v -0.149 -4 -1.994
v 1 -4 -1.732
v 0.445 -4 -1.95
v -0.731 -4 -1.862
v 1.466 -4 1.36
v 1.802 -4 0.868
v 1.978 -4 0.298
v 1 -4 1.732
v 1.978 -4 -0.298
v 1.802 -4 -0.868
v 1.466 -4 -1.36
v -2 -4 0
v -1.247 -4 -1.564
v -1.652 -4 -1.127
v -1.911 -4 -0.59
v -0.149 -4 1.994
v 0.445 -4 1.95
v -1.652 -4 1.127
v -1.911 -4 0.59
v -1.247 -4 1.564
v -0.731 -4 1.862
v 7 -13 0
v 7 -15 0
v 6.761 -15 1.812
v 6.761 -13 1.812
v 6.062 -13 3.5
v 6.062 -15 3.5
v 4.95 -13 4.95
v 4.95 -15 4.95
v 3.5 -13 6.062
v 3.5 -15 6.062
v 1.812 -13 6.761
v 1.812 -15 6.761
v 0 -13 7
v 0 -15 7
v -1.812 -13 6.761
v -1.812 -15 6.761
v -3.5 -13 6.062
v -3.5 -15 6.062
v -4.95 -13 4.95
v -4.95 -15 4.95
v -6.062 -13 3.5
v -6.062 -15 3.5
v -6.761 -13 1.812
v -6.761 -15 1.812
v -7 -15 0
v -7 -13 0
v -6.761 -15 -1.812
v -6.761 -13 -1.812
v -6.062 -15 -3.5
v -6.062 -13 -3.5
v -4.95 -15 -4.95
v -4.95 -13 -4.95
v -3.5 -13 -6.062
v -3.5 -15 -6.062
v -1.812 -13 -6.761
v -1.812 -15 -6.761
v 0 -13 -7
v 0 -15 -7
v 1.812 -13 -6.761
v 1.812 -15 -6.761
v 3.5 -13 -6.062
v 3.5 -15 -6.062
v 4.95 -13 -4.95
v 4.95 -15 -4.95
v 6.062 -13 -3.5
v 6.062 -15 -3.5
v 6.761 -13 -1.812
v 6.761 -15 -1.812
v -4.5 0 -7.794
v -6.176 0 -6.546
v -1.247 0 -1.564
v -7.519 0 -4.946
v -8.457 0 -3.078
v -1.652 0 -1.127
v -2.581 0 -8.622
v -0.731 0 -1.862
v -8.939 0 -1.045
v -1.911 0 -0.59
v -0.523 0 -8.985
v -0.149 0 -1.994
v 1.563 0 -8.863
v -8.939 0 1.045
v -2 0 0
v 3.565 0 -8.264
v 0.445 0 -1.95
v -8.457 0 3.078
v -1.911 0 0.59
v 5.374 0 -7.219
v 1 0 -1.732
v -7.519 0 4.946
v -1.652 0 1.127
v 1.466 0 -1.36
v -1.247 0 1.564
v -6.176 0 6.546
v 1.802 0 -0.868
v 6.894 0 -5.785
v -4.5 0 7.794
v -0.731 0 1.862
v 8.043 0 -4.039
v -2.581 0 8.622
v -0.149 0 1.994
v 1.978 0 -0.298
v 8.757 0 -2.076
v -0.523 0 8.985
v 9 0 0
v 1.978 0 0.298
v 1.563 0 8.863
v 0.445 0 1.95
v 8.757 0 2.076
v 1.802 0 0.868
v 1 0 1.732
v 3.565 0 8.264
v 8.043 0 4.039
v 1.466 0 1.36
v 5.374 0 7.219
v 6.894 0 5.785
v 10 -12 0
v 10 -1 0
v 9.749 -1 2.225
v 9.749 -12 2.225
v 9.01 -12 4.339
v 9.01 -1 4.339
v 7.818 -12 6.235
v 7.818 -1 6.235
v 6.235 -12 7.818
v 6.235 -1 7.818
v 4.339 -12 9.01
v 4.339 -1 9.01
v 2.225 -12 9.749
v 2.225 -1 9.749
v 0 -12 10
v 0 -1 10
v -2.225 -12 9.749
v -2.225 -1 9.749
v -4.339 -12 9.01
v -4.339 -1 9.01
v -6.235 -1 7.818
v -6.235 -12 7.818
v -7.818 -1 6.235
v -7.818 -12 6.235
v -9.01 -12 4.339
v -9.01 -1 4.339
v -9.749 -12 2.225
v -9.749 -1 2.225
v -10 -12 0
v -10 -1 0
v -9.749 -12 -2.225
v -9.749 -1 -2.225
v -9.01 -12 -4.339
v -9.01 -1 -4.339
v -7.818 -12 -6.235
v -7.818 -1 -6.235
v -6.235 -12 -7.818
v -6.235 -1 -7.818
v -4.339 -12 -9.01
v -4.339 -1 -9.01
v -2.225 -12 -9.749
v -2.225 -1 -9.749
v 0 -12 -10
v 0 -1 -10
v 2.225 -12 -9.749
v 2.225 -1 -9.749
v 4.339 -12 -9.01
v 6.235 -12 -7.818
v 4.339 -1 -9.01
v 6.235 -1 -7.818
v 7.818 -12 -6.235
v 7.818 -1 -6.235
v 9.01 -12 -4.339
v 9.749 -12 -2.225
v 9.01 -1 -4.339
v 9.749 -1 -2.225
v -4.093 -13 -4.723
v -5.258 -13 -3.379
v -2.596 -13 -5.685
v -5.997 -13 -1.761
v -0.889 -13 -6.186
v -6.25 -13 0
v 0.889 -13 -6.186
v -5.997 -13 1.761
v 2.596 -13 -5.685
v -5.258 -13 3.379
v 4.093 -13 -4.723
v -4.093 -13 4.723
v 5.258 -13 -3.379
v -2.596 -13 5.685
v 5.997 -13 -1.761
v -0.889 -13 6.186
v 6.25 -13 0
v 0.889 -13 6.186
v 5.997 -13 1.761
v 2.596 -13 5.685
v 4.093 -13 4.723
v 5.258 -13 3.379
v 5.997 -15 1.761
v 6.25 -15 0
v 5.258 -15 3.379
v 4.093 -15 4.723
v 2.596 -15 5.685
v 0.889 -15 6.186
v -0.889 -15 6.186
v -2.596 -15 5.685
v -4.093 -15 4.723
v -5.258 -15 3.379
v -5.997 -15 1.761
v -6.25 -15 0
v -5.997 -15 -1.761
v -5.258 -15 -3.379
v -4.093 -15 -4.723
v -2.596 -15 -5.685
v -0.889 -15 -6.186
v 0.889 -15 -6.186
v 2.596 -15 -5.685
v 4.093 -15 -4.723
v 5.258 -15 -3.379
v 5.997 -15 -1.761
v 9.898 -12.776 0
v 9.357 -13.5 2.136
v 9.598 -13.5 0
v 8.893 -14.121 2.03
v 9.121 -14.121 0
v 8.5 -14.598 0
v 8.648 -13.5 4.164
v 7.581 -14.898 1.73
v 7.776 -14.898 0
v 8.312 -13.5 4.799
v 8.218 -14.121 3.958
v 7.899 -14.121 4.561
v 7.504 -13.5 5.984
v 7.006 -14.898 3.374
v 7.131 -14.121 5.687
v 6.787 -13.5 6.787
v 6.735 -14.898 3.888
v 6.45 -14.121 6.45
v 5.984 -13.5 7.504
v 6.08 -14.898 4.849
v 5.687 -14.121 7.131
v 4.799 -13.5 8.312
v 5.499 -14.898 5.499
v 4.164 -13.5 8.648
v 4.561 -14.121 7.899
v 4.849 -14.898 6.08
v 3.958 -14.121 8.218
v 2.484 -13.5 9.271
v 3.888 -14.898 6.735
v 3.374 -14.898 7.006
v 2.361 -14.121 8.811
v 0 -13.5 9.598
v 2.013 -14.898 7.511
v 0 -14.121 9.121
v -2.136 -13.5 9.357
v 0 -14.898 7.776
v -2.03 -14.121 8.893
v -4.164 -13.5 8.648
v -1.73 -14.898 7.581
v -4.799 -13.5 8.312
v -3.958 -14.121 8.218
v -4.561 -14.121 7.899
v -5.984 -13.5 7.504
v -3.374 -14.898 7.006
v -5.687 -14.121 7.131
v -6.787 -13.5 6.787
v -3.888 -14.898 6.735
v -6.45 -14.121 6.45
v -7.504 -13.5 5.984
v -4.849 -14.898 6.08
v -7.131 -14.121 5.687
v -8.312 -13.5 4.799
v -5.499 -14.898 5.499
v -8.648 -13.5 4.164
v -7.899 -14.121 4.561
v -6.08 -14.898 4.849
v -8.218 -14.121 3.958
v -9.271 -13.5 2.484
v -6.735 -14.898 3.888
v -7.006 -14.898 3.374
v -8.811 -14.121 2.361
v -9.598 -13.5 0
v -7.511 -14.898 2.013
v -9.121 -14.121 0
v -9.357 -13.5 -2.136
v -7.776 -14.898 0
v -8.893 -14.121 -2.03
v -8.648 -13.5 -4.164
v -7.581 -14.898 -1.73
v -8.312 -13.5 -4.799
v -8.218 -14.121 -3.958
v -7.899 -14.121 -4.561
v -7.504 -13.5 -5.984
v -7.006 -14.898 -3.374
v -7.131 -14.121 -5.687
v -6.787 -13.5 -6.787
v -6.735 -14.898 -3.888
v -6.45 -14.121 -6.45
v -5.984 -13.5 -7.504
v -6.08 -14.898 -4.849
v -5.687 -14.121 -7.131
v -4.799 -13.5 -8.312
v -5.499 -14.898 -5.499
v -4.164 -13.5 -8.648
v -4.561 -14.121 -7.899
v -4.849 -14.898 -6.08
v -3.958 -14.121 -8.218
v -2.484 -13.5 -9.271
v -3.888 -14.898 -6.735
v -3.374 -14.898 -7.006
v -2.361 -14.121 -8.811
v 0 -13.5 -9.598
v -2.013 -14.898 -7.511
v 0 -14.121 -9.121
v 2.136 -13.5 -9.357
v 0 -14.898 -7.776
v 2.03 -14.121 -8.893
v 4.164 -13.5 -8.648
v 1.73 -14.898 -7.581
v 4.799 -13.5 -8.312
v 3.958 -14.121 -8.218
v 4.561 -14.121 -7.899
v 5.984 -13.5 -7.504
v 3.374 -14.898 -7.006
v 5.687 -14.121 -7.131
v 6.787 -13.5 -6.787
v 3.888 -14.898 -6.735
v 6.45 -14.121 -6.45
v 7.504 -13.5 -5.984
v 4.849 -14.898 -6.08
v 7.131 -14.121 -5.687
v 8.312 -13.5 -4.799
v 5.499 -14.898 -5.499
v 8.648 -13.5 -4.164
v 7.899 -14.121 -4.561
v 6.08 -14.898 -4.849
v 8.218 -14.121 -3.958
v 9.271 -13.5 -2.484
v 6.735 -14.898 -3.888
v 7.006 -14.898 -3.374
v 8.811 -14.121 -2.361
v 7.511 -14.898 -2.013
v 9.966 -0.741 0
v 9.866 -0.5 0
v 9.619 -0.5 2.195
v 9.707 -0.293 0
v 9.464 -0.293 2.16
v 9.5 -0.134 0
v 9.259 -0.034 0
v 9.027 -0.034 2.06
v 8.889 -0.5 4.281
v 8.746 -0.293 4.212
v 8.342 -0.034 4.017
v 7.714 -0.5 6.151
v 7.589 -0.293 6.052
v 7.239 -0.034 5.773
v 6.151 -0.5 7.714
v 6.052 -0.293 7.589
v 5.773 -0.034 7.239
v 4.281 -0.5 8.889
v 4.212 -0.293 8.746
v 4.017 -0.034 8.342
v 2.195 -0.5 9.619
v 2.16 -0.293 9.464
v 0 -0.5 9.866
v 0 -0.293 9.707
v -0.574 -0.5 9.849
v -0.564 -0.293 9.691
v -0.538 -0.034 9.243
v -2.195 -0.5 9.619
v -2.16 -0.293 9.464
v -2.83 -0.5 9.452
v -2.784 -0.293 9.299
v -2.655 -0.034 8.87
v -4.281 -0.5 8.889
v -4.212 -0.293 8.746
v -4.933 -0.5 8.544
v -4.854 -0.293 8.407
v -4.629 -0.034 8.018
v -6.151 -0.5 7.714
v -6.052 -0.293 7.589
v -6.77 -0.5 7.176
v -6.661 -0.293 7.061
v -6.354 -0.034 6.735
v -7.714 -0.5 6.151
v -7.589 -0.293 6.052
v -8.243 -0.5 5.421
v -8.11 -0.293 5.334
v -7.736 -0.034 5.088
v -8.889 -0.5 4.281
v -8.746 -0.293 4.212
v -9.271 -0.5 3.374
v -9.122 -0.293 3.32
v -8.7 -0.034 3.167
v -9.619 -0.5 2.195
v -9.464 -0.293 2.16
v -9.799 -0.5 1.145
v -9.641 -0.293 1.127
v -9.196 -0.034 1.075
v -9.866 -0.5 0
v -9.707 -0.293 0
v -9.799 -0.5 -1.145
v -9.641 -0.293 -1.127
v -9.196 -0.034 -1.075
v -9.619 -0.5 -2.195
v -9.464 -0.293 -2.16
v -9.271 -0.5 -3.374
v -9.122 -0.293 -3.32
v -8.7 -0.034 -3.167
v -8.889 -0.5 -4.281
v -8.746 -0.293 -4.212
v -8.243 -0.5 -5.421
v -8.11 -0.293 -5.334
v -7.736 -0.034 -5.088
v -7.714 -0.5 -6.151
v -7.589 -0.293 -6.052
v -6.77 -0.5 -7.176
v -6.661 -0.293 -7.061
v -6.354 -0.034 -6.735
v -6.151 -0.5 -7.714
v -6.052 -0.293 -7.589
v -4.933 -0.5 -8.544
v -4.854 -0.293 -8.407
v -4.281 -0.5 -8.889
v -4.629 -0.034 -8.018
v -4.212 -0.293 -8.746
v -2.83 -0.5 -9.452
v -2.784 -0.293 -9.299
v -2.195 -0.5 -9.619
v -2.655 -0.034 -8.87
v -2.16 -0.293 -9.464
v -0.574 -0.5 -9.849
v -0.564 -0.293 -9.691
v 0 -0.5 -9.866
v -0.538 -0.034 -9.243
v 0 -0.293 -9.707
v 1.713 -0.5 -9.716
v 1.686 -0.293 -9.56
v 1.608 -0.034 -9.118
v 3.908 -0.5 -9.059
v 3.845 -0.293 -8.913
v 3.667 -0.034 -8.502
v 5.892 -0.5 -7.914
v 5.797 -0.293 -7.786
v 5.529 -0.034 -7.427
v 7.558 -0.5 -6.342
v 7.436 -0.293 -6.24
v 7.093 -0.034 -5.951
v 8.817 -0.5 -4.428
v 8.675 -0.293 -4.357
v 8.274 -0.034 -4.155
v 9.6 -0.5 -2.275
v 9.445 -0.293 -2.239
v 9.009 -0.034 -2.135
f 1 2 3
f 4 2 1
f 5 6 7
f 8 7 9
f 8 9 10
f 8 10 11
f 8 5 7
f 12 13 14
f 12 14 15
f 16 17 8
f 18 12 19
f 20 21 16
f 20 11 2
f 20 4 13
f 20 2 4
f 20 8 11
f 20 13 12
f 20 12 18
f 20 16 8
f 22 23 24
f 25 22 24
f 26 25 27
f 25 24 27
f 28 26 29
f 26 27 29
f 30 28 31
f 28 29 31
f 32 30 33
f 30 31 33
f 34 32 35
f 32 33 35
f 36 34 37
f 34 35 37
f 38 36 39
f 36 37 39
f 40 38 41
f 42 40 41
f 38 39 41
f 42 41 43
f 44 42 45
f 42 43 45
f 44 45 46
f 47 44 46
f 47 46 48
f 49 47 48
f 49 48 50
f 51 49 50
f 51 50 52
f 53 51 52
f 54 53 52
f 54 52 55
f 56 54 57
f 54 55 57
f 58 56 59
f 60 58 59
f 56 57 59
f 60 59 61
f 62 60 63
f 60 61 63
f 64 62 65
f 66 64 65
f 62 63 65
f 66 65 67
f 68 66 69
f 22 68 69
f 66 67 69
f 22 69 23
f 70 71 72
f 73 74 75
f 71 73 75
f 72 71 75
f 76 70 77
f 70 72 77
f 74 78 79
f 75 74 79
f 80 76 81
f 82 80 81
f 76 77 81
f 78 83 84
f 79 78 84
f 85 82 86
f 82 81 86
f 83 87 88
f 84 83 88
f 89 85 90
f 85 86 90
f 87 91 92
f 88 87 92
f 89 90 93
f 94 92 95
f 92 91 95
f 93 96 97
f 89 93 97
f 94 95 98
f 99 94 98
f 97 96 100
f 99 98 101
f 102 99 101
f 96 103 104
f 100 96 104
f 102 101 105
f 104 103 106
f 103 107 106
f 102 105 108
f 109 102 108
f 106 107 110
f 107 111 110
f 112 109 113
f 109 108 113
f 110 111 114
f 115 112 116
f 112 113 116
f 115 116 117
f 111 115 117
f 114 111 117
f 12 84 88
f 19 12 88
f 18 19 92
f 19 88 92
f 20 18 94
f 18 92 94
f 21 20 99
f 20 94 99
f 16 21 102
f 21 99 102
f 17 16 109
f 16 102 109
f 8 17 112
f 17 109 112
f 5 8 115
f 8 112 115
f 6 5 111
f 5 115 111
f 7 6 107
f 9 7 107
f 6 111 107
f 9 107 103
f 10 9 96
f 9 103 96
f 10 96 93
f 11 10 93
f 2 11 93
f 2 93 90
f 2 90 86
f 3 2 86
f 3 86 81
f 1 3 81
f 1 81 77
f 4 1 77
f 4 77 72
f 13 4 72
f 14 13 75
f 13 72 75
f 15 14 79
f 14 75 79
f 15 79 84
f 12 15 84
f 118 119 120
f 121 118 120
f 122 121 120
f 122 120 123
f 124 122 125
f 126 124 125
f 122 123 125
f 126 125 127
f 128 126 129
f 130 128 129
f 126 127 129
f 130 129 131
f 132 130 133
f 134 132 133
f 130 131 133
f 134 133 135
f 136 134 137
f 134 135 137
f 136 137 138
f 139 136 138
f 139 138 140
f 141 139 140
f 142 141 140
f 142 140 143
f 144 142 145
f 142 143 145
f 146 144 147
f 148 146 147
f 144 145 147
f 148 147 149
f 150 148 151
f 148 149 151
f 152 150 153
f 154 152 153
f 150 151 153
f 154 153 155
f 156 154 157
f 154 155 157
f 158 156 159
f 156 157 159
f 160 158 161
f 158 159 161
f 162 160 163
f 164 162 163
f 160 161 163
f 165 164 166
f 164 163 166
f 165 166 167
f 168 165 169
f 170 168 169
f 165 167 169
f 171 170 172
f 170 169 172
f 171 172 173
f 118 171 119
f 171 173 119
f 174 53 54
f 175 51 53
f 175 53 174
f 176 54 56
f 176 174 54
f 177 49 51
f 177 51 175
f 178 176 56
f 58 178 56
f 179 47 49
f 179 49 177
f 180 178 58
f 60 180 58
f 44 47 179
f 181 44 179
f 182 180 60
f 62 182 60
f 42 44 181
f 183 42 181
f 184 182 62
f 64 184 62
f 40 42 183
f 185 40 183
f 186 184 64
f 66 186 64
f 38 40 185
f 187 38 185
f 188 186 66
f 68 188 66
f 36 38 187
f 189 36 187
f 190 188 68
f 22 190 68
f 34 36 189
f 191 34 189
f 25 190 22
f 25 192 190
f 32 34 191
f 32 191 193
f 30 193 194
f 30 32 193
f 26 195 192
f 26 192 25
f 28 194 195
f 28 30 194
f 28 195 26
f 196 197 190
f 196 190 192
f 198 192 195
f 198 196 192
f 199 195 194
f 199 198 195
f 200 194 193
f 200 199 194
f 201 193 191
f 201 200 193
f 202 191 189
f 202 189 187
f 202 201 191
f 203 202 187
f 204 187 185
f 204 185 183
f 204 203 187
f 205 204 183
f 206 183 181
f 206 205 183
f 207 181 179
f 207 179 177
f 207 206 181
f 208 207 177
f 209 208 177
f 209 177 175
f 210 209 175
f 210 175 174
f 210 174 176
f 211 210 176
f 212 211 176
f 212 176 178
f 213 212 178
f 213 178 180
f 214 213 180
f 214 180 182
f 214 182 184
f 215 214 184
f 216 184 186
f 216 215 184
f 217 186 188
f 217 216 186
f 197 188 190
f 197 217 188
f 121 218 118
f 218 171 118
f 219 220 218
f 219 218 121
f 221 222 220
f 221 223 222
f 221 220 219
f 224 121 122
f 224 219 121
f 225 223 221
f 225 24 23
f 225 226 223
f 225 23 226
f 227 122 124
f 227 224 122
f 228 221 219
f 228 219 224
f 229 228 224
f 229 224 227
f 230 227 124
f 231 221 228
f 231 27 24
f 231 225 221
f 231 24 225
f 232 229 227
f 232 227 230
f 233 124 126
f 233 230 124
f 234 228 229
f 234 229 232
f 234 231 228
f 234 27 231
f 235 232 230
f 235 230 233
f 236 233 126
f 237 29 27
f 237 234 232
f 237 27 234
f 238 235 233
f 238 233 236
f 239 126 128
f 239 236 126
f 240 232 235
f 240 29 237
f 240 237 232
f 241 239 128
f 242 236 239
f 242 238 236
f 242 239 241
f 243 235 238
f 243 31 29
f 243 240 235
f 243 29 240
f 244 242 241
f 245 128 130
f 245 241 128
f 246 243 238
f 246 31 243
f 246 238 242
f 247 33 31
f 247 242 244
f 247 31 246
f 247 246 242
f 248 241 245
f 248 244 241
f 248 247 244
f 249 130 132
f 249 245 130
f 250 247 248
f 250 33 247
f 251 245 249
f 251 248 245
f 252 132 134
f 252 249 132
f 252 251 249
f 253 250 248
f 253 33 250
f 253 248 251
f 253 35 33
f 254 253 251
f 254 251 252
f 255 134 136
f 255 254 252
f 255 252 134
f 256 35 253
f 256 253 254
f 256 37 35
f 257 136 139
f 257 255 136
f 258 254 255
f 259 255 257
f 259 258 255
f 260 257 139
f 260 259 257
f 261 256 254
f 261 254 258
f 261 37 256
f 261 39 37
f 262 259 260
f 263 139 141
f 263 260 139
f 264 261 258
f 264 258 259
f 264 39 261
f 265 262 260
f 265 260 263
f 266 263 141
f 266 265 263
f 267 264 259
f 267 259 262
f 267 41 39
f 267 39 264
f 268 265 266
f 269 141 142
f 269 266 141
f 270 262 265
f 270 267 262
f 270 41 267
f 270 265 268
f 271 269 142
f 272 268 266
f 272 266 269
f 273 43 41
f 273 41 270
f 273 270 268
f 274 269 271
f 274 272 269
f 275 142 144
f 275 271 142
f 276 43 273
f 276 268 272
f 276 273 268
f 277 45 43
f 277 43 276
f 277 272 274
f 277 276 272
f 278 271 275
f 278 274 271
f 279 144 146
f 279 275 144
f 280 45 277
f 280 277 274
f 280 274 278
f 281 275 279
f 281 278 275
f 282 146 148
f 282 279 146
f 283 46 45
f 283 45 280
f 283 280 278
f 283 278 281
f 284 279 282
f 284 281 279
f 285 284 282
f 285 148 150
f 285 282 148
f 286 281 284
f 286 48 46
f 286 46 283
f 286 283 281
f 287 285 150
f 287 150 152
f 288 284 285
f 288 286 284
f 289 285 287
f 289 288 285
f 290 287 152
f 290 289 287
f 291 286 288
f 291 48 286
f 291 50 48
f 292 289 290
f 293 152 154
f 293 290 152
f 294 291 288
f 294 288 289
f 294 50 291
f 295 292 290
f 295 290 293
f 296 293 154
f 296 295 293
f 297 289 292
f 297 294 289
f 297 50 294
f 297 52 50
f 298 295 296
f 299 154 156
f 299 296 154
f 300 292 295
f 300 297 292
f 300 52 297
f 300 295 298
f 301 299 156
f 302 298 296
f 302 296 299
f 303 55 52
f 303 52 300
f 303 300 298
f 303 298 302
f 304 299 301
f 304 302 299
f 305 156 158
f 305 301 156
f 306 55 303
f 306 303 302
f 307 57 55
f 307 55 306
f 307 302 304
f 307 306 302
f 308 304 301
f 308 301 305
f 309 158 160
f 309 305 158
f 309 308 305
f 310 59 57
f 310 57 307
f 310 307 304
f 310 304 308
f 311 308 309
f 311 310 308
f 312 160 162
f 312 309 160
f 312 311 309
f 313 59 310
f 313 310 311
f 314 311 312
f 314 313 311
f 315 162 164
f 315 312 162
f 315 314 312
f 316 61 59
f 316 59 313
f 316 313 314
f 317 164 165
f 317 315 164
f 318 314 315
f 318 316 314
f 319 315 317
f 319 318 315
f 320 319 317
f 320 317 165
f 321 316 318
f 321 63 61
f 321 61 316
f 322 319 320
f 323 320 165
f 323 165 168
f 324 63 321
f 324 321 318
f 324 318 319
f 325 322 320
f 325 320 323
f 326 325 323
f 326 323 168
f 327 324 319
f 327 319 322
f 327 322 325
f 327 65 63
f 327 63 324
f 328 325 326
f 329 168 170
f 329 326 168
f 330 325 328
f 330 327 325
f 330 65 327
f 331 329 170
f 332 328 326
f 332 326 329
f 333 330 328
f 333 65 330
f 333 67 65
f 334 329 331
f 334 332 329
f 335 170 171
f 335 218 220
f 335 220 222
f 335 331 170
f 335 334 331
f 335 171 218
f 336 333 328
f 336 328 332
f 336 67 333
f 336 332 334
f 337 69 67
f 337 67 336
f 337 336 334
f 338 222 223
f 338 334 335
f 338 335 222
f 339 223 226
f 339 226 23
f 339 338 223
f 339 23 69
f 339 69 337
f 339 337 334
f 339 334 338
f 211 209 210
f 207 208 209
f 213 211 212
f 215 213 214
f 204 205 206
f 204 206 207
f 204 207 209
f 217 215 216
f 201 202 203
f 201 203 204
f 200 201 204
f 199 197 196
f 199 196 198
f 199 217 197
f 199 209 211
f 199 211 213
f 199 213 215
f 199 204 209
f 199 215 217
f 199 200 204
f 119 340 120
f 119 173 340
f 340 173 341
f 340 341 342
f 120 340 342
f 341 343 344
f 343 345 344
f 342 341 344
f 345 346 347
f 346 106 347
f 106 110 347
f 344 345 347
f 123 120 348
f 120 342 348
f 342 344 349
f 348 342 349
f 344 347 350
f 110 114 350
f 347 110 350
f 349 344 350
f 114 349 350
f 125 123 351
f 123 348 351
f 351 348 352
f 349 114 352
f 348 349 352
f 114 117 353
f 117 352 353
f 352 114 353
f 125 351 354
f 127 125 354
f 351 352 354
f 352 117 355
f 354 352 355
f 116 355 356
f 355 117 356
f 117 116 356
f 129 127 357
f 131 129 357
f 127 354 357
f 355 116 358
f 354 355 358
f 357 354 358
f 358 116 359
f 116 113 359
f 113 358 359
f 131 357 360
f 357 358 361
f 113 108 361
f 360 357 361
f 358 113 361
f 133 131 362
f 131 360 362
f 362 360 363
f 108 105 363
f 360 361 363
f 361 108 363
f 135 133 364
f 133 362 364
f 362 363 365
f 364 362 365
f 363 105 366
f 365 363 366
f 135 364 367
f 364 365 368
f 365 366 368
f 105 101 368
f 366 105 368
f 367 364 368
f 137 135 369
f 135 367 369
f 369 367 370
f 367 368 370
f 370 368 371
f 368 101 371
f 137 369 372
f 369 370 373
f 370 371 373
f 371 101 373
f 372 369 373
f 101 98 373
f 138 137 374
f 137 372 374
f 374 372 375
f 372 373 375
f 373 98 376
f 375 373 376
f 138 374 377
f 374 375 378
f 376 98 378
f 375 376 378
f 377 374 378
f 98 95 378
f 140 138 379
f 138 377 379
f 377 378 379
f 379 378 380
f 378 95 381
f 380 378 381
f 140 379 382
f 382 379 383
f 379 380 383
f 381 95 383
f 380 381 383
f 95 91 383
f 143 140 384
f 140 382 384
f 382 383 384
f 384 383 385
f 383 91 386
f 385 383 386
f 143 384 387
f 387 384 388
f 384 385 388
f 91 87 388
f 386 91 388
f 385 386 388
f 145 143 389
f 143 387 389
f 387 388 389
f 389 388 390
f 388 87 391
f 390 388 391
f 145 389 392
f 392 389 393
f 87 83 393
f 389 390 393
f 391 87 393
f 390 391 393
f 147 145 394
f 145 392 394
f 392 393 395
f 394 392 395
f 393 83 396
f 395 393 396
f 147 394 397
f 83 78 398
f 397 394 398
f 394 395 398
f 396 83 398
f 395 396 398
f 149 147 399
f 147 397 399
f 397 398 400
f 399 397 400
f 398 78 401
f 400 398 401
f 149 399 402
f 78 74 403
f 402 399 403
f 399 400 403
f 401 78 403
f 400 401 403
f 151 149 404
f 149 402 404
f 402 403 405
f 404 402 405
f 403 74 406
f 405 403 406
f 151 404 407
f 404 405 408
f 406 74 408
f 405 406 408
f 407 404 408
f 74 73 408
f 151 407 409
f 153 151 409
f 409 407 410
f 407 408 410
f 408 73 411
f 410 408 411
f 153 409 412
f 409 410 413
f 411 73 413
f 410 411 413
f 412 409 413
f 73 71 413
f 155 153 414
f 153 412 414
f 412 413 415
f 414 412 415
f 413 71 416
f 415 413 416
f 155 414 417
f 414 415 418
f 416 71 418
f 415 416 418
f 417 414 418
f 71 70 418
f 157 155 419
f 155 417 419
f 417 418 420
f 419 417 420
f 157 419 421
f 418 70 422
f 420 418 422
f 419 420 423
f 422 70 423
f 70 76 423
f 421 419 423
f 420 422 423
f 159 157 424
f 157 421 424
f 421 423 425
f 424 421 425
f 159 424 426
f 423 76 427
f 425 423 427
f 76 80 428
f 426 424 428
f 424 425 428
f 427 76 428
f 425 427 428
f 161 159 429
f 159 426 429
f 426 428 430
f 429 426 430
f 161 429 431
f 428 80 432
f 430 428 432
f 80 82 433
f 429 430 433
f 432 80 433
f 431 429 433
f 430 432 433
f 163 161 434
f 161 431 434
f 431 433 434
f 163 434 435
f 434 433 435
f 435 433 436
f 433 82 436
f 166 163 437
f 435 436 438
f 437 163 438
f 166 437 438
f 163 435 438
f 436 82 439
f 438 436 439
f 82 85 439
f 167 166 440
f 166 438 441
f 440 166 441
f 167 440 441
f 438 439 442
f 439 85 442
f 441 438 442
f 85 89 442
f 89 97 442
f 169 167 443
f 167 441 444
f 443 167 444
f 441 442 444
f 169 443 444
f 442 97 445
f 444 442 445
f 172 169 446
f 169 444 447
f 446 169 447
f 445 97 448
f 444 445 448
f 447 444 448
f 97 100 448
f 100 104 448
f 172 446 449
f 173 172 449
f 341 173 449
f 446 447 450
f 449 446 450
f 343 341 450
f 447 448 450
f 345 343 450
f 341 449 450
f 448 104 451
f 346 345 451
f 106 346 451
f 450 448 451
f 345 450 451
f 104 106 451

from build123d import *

# Parameters (mm, degrees)
F0_R     = 10
F1_DEPTH = 15
F2_R     = 3
F3_R     = 1
F4_R     = 2
F5_DEPTH = 4
F6_R     = 7
F6_R_2   = 6.25
F8_DEPTH = 2


with BuildPart() as f1:
    # F0 (on Front) → F1 (new body)
    with BuildSketch(Plane.XZ):
        Circle(F0_R)
    extrude(amount=F1_DEPTH)

    # F2
    f2_edges = [f1.edges().sort_by_distance(p)[0] for p in [
        (-10, -15, 0),
    ]]
    fillet(f2_edges, radius=F2_R)

    # F3
    f3_edges = [f1.edges().sort_by_distance(p)[0] for p in [
        (-10, 0, 0),
    ]]
    fillet(f3_edges, radius=F3_R)

    # F4 (on face) → F5 (cut)
    with BuildSketch(Plane(origin=(0, 0, 0), x_dir=(-1, 0, 0), z_dir=(0, 1, 0))):
        Circle(F4_R)
    extrude(amount=-F5_DEPTH, mode=Mode.SUBTRACT)

    # F6 (on face) → F8 (cut)
    with BuildSketch(Plane.XZ.offset(15)):
        Circle(F6_R)
        Circle(F6_R_2, mode=Mode.SUBTRACT)
    extrude(amount=-F8_DEPTH, mode=Mode.SUBTRACT)


solid = f1.part
